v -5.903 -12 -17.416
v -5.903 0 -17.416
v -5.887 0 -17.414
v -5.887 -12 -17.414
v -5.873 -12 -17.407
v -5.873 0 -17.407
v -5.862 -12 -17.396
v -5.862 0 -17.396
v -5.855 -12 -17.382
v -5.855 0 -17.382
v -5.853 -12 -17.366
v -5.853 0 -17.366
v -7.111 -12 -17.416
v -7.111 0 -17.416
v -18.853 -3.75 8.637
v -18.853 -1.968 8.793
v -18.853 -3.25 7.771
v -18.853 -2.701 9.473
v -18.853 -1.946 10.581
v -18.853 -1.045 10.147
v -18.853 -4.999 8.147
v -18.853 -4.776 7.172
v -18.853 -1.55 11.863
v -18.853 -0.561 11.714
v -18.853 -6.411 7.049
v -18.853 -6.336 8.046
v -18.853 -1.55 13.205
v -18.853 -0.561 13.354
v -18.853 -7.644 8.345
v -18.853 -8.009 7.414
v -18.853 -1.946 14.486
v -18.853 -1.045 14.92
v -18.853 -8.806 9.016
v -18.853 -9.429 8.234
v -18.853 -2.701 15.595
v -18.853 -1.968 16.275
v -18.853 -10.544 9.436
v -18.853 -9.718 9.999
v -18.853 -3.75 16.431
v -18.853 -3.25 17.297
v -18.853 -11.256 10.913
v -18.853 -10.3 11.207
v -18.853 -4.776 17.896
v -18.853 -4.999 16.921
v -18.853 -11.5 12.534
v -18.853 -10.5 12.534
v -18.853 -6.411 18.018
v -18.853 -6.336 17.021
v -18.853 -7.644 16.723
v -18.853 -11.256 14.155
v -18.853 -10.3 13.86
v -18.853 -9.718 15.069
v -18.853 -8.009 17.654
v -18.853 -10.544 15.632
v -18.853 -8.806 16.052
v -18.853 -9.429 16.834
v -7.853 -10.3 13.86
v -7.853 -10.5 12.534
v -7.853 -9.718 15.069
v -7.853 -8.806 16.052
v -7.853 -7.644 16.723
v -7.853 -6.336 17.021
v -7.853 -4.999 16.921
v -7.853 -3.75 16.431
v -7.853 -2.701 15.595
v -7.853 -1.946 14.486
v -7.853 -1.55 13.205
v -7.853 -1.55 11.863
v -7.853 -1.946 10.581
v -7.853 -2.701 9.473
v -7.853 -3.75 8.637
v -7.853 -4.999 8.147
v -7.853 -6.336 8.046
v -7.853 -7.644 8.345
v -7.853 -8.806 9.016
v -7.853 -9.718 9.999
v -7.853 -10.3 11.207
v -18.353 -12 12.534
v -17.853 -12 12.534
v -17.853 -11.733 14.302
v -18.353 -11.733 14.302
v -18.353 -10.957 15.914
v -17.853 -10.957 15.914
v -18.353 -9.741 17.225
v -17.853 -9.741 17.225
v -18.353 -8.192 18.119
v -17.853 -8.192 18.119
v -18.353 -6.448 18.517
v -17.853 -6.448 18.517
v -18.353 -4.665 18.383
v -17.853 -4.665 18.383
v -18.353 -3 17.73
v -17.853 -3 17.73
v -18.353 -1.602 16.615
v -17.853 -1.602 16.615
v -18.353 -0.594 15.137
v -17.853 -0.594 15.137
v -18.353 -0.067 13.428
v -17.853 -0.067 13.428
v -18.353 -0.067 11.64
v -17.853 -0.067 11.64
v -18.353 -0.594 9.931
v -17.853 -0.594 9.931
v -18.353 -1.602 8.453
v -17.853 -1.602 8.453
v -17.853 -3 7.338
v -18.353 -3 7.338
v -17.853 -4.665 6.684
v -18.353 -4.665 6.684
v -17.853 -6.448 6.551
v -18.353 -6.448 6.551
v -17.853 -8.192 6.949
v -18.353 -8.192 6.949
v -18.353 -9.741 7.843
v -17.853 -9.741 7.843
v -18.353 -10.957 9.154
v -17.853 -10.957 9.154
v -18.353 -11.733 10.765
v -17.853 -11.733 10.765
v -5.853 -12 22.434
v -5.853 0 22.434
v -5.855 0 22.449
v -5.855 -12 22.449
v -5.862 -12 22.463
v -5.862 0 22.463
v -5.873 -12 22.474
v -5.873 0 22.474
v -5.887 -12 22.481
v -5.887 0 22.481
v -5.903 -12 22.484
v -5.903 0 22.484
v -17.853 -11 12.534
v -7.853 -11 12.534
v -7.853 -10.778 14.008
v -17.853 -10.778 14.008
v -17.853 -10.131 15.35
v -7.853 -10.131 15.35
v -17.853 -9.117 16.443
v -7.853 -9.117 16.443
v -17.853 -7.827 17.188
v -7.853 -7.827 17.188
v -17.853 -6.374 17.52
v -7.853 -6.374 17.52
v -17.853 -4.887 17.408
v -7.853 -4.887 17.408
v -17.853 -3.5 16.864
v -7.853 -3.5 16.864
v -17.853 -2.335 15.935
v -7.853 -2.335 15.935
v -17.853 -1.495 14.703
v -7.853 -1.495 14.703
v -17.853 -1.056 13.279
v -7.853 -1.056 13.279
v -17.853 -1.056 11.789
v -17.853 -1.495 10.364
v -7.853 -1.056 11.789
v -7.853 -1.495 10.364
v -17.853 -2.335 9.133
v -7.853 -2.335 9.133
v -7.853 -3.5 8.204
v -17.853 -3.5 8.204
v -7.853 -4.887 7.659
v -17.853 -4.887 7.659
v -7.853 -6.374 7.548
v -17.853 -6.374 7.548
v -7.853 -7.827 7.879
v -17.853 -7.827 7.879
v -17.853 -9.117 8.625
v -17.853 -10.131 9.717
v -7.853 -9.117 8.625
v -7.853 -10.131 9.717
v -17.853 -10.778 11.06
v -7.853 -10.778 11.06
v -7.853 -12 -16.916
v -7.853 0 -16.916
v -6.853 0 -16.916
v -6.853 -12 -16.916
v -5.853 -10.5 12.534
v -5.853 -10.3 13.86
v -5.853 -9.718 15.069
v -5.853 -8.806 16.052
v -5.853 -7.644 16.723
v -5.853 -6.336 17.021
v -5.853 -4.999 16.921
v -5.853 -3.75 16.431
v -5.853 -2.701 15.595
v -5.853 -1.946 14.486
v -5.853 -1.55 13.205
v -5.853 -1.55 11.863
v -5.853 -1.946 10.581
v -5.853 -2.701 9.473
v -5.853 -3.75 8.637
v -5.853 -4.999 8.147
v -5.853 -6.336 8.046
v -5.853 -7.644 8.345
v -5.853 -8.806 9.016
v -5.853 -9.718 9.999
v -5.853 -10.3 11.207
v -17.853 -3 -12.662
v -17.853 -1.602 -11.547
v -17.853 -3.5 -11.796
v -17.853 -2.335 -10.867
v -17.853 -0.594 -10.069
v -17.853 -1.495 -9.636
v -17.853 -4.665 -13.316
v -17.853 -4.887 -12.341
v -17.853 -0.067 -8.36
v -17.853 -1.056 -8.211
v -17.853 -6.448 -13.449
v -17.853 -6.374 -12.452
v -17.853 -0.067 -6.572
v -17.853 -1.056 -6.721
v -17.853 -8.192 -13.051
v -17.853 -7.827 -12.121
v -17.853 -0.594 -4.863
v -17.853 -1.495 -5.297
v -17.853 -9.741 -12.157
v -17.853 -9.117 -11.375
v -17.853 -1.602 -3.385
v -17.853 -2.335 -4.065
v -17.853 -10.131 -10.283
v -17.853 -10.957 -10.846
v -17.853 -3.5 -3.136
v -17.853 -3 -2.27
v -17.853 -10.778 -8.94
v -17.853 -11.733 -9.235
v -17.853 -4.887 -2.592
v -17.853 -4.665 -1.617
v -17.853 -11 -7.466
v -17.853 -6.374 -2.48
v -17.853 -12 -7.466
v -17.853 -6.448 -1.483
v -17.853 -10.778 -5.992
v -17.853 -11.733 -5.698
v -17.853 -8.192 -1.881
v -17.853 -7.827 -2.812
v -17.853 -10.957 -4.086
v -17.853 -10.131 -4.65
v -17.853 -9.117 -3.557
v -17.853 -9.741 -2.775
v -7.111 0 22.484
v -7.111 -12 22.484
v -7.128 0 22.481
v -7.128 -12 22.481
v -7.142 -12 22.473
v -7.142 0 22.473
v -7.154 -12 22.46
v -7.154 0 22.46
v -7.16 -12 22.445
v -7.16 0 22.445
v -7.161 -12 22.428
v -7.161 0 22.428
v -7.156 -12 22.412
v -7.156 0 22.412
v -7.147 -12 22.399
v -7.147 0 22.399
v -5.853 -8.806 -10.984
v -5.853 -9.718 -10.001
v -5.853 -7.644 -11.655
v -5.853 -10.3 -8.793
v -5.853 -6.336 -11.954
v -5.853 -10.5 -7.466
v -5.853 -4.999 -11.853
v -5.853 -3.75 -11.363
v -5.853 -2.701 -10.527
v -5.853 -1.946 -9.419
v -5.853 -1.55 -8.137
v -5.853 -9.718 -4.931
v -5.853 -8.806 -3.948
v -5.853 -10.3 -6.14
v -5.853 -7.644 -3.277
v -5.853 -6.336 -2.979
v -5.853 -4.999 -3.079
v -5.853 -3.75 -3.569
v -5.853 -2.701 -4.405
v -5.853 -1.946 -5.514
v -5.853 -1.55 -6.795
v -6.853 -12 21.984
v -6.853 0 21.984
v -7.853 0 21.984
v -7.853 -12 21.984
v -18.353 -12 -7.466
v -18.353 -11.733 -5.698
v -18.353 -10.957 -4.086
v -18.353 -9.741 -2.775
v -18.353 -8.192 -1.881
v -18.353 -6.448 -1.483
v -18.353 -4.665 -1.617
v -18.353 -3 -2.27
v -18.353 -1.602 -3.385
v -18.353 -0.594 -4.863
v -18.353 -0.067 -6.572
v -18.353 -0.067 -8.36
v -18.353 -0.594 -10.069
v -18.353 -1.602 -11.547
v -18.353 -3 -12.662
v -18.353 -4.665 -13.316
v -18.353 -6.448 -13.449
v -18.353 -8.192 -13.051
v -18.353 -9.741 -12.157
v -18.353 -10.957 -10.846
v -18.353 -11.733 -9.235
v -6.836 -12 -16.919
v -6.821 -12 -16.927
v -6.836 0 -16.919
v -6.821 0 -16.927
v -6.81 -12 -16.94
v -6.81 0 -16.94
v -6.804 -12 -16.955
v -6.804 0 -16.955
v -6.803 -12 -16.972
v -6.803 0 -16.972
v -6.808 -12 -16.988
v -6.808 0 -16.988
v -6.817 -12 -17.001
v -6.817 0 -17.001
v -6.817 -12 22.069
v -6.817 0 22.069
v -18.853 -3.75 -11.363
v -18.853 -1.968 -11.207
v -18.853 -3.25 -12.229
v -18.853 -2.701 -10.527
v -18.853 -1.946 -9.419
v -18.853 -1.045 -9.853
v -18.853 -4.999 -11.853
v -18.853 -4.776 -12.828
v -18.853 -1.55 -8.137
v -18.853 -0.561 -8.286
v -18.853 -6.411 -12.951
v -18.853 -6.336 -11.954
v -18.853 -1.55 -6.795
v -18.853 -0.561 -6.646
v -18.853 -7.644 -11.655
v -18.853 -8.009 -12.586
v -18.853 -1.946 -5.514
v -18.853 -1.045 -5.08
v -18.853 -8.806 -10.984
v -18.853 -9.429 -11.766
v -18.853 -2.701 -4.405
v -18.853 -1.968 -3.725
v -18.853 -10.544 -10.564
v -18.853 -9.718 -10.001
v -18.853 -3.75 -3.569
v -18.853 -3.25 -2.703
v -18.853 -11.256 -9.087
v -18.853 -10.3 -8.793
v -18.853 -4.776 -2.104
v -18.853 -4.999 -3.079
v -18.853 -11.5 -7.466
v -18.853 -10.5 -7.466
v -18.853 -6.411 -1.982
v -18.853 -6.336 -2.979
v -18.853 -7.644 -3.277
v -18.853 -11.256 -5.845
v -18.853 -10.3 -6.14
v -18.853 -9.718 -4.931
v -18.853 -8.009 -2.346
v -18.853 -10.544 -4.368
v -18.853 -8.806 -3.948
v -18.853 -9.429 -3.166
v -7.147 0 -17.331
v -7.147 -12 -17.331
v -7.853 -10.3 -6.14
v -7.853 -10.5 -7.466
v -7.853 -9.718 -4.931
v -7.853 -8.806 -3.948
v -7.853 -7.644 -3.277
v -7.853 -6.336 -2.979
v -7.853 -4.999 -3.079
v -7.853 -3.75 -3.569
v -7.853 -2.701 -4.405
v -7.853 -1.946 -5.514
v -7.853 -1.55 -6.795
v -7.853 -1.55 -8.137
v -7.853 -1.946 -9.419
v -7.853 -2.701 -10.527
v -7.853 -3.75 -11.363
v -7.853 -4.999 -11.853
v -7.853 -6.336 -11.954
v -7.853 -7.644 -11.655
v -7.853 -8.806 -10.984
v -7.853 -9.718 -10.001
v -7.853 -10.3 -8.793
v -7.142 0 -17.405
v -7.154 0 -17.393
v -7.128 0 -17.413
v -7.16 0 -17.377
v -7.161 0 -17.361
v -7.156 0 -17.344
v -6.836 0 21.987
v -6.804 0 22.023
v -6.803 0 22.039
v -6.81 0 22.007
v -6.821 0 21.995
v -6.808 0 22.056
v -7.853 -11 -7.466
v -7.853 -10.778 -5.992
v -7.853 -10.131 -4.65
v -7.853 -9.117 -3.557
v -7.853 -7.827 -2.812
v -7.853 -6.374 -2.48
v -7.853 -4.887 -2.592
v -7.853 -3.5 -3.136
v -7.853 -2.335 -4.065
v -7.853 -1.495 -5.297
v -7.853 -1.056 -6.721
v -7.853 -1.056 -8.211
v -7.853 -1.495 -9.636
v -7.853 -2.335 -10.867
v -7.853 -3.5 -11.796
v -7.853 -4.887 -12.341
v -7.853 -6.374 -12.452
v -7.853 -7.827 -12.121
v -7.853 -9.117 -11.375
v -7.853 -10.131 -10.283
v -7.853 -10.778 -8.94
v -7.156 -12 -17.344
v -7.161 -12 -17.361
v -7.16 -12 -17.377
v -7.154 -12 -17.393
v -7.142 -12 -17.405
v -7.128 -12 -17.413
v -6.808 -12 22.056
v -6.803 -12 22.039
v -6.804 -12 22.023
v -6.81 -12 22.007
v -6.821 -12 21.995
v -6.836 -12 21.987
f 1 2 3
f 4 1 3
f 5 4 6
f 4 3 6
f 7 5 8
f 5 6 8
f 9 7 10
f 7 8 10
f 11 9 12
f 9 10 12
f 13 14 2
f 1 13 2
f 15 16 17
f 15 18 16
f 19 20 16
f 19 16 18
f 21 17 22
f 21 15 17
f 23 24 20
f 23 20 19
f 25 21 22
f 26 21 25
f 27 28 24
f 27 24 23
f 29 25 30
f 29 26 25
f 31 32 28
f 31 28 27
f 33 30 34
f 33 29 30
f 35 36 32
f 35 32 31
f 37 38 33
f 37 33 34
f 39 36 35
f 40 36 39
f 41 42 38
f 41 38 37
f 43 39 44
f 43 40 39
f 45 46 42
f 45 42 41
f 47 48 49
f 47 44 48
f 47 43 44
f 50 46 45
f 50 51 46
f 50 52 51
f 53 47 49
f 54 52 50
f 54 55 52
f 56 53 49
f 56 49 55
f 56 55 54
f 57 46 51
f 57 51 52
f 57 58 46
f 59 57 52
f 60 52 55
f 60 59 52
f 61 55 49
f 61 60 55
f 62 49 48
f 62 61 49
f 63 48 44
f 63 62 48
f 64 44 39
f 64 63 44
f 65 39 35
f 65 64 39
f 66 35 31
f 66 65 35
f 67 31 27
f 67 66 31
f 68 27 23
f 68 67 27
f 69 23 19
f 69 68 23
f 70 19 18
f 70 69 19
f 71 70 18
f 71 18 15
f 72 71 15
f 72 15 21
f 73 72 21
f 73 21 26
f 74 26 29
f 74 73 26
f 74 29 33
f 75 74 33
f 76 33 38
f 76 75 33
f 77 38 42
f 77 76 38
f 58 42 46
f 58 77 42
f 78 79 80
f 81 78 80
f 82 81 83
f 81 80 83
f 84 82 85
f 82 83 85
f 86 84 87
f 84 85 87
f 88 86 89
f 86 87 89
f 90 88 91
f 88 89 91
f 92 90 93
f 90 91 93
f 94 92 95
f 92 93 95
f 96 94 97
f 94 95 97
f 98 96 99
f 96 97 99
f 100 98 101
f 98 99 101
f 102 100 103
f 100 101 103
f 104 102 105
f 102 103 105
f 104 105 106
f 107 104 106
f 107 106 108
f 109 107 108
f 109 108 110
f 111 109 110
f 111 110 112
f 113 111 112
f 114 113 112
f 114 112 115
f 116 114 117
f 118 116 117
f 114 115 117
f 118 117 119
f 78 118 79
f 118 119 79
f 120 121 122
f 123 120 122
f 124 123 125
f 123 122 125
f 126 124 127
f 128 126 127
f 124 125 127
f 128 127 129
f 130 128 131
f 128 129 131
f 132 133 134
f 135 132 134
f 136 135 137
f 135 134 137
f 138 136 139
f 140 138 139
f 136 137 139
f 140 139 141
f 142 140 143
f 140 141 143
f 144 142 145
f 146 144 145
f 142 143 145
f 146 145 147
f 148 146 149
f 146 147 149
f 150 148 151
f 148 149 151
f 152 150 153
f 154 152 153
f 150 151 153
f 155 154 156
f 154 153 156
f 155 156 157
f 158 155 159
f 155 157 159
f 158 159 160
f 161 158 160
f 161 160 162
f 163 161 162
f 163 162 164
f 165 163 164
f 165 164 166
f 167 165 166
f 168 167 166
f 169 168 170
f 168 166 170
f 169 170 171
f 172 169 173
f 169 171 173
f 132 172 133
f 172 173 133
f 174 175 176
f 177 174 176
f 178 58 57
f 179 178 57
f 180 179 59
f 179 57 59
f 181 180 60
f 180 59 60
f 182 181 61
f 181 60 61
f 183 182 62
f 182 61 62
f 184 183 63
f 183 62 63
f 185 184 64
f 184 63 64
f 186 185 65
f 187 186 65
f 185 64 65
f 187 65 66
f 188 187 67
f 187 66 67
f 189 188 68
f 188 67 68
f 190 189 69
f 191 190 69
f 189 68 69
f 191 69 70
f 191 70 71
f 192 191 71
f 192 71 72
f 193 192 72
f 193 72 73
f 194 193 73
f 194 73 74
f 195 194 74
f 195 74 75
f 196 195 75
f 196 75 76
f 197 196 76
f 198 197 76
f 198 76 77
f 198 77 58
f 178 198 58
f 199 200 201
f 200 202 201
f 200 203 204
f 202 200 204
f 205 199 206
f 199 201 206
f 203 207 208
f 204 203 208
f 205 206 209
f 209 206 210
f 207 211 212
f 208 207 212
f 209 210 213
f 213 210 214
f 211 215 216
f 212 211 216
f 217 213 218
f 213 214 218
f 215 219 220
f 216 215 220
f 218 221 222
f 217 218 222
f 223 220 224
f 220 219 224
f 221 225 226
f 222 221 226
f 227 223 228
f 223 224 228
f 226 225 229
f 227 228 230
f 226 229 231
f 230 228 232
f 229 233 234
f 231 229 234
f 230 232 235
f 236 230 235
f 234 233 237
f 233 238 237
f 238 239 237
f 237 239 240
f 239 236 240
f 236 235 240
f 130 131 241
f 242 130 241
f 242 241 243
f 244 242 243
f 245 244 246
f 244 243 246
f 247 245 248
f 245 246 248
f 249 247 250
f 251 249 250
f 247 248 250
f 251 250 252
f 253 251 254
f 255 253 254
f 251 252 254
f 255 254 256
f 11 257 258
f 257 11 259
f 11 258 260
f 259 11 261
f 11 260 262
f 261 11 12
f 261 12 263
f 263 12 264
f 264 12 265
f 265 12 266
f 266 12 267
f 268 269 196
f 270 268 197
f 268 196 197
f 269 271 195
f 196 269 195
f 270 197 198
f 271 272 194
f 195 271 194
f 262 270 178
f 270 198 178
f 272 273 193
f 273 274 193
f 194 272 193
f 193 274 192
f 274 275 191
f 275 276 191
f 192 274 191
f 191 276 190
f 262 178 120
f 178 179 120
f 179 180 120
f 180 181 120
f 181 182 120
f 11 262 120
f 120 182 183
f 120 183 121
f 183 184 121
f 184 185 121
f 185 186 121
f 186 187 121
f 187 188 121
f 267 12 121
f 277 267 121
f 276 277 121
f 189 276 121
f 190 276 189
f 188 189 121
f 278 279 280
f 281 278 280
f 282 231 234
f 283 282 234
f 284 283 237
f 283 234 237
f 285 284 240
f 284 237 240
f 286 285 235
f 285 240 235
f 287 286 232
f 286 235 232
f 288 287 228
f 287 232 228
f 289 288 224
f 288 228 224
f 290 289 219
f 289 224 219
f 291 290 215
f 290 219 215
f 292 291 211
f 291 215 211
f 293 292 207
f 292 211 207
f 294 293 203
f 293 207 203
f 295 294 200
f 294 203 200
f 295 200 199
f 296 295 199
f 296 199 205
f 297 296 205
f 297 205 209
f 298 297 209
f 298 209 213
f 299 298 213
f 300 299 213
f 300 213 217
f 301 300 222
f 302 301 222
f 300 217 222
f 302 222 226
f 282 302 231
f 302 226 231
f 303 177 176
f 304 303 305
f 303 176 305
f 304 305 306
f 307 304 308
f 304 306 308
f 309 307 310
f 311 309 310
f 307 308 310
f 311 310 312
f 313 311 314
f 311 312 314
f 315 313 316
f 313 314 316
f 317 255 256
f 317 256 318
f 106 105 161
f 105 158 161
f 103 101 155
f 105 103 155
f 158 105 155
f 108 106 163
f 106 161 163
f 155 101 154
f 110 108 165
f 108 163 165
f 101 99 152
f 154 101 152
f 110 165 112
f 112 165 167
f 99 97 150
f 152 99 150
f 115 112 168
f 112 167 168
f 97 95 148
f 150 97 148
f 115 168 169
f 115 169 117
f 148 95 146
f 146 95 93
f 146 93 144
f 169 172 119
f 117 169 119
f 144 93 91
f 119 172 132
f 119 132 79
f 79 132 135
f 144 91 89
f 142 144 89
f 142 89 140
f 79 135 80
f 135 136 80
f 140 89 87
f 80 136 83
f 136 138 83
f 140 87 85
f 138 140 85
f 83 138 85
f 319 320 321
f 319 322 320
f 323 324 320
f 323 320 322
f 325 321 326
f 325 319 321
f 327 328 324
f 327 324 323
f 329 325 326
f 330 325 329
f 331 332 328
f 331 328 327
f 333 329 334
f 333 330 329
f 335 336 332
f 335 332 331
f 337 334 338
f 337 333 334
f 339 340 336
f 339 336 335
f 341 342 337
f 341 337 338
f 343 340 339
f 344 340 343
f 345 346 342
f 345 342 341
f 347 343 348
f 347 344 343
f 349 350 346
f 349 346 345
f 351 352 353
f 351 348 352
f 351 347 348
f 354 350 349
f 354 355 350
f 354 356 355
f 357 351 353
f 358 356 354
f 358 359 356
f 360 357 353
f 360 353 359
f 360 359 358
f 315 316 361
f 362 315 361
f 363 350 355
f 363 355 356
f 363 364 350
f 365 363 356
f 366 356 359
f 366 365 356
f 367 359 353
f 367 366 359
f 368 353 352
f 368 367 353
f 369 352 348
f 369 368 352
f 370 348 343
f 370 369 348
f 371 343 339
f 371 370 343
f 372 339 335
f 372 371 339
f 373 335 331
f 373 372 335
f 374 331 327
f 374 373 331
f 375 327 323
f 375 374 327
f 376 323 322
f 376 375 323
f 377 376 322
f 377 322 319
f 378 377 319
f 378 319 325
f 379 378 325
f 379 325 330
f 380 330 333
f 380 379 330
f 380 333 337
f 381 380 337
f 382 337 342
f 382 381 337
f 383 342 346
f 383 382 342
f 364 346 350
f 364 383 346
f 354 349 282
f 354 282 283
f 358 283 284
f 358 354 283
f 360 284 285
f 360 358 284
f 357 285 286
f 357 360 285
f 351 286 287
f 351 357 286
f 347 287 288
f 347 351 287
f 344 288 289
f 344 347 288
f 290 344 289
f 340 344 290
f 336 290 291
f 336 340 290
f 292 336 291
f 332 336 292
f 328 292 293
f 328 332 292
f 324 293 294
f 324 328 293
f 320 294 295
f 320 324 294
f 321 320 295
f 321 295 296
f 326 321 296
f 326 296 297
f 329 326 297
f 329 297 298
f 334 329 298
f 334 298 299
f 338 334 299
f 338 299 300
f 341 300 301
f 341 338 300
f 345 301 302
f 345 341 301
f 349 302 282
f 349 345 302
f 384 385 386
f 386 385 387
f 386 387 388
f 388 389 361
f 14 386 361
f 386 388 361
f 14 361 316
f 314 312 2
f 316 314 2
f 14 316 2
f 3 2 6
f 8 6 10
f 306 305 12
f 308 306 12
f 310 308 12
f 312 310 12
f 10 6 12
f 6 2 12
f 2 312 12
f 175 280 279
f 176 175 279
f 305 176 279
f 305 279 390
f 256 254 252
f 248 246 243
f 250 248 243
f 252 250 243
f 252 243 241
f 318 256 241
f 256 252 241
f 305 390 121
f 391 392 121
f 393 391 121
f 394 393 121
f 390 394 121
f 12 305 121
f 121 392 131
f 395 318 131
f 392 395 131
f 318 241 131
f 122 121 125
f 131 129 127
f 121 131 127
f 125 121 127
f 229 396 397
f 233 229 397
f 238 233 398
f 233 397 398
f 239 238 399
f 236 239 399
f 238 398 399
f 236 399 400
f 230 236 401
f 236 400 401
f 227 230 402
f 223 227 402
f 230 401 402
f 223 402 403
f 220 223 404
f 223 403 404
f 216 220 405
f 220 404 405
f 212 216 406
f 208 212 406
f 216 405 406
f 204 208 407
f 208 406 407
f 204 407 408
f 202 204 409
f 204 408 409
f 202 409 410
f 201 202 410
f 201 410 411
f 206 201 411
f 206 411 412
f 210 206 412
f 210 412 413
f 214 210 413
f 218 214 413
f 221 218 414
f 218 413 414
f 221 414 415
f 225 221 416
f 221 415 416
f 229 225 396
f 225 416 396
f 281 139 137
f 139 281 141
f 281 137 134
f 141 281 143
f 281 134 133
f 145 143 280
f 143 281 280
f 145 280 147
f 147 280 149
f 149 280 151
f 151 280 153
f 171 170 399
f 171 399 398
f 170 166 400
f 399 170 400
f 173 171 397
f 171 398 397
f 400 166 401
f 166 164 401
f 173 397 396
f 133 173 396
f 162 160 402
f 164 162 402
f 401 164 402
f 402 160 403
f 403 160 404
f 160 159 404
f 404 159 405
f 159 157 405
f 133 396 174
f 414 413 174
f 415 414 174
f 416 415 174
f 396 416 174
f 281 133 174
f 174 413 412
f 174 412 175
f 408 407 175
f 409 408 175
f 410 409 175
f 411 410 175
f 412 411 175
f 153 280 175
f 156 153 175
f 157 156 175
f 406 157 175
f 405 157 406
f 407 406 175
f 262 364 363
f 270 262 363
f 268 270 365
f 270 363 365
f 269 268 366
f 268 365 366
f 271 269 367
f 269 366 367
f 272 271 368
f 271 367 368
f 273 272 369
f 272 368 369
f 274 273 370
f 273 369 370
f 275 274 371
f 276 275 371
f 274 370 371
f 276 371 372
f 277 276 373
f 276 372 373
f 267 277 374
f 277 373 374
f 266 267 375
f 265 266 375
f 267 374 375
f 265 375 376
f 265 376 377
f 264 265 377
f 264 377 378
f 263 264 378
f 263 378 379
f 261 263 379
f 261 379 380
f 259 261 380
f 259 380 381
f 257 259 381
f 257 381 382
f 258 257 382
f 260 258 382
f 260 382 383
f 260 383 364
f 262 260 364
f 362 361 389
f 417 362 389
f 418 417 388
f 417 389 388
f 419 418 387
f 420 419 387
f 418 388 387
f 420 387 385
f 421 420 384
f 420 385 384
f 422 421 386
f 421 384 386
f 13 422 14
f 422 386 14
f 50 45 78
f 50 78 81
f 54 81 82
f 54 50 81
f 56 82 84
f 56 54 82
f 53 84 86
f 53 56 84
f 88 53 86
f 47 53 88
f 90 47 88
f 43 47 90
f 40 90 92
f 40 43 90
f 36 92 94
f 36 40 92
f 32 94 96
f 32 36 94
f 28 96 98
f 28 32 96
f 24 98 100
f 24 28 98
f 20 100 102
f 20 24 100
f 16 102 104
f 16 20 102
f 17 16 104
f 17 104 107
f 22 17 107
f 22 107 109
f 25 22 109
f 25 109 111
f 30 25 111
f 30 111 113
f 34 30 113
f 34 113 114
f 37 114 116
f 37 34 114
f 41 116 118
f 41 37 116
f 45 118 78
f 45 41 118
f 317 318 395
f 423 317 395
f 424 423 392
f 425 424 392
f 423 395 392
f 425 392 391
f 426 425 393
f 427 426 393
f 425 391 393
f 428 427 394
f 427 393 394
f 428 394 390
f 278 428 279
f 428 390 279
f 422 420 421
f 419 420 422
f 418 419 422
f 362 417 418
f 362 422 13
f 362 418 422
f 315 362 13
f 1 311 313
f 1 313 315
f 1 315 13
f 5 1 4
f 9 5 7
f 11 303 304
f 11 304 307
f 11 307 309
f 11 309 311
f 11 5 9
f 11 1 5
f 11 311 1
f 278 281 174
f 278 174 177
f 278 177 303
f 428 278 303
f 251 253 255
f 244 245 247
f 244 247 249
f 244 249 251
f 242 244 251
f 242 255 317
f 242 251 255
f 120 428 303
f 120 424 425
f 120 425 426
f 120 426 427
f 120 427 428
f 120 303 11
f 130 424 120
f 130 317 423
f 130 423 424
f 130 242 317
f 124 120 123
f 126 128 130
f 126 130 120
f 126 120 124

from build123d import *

# Parameters (mm, degrees)
F1_DEPTH = 12
F2_R     = 5
F2_R_2   = 4.5
F3_DEPTH = 10
F4_R     = 6
F4_R_2   = 4.5
F5_DEPTH = 1
F6_DEPTH = 25
F7_SIZE  = 0.5


with BuildPart() as f1:
    # F0 (on Front) → F1 (new body)
    with BuildSketch(Plane.XZ):
        with BuildLine():
            Line((-5.8526312746, -17.3661426386), (-5.8526312746, 22.4338573614))
            ThreePointArc((-5.8526312746, 22.4338573614), (-5.8672759356, 22.4692127005), (-5.9026312746, 22.4838573614))
            Line((-5.9026312746, 22.4838573614), (-7.1112099184, 22.4838573614))
            ThreePointArc((-7.1112099184, 22.4838573614), (-7.157403895, 22.452991533), (-7.1465652574, 22.3985020224))
            Line((-7.1465652574, 22.3985020224), (-6.8172759356, 22.0692127005))
            ThreePointArc((-6.8172759356, 22.0692127005), (-6.806437298, 22.0147231898), (-6.8526312746, 21.9838573614))
            Line((-6.8526312746, 21.9838573614), (-7.8526312746, 21.9838573614))
            Line((-7.8526312746, 21.9838573614), (-7.8526312746, -16.9161426386))
            Line((-7.8526312746, -16.9161426386), (-6.8526312746, -16.9161426386))
            ThreePointArc((-6.8526312746, -16.9161426386), (-6.806437298, -16.947008467), (-6.8172759356, -17.0014979776))
            Line((-6.8172759356, -17.0014979776), (-7.1465652574, -17.3307872995))
            ThreePointArc((-7.1465652574, -17.3307872995), (-7.157403895, -17.3852768102), (-7.1112099184, -17.4161426386))
            Line((-7.1112099184, -17.4161426386), (-5.9026312746, -17.4161426386))
            ThreePointArc((-5.9026312746, -17.4161426386), (-5.8672759356, -17.4014979776), (-5.8526312746, -17.3661426386))
        make_face()
    extrude(amount=F1_DEPTH)

    # F2 (on face) → F3 (join)
    with BuildSketch(Plane(origin=(-7.8526312746, 0, 0), x_dir=(0, -1, 0), z_dir=(-1, 0, 0))):
        with Locations((6, 12.5338573614)):
            Circle(F2_R)
        with Locations((6, 12.5338573614)):
            Circle(F2_R_2, mode=Mode.SUBTRACT)
        with Locations((6, -7.4661426386)):
            Circle(F2_R)
        with Locations((6, -7.4661426386)):
            Circle(F2_R_2, mode=Mode.SUBTRACT)
    extrude(amount=F3_DEPTH)

    # F4 (on face) → F5 (join)
    with BuildSketch(Plane(origin=(-17.8526312746, 0, 0), x_dir=(0, -1, 0), z_dir=(-1, 0, 0))):
        with Locations((6, 12.5338573614)):
            Circle(F4_R)
        with Locations((6, 12.5338573614)):
            Circle(F4_R_2, mode=Mode.SUBTRACT)
        with Locations((6, -7.4661426386)):
            Circle(F4_R)
        with Locations((6, -7.4661426386)):
            Circle(F4_R_2, mode=Mode.SUBTRACT)
    extrude(amount=F5_DEPTH)

    # F6 (cut): faces of the model
    f6_faces = [f1.faces().sort_by_distance(p)[0] for p in [
        (-7.8526312746, -6, 12.5338573614),
        (-7.8526312746, -6, -7.4661426386),
    ]]
    extrude(f6_faces, amount=-F6_DEPTH, mode=Mode.SUBTRACT)

    # F7
    f7_edges = [f1.edges().sort_by_distance(p)[0] for p in [
        (-18.852631, 0, 12.533857),
        (-18.852631, 0, -7.466143),
    ]]
    chamfer(f7_edges, length=F7_SIZE)


solid = f1.part
